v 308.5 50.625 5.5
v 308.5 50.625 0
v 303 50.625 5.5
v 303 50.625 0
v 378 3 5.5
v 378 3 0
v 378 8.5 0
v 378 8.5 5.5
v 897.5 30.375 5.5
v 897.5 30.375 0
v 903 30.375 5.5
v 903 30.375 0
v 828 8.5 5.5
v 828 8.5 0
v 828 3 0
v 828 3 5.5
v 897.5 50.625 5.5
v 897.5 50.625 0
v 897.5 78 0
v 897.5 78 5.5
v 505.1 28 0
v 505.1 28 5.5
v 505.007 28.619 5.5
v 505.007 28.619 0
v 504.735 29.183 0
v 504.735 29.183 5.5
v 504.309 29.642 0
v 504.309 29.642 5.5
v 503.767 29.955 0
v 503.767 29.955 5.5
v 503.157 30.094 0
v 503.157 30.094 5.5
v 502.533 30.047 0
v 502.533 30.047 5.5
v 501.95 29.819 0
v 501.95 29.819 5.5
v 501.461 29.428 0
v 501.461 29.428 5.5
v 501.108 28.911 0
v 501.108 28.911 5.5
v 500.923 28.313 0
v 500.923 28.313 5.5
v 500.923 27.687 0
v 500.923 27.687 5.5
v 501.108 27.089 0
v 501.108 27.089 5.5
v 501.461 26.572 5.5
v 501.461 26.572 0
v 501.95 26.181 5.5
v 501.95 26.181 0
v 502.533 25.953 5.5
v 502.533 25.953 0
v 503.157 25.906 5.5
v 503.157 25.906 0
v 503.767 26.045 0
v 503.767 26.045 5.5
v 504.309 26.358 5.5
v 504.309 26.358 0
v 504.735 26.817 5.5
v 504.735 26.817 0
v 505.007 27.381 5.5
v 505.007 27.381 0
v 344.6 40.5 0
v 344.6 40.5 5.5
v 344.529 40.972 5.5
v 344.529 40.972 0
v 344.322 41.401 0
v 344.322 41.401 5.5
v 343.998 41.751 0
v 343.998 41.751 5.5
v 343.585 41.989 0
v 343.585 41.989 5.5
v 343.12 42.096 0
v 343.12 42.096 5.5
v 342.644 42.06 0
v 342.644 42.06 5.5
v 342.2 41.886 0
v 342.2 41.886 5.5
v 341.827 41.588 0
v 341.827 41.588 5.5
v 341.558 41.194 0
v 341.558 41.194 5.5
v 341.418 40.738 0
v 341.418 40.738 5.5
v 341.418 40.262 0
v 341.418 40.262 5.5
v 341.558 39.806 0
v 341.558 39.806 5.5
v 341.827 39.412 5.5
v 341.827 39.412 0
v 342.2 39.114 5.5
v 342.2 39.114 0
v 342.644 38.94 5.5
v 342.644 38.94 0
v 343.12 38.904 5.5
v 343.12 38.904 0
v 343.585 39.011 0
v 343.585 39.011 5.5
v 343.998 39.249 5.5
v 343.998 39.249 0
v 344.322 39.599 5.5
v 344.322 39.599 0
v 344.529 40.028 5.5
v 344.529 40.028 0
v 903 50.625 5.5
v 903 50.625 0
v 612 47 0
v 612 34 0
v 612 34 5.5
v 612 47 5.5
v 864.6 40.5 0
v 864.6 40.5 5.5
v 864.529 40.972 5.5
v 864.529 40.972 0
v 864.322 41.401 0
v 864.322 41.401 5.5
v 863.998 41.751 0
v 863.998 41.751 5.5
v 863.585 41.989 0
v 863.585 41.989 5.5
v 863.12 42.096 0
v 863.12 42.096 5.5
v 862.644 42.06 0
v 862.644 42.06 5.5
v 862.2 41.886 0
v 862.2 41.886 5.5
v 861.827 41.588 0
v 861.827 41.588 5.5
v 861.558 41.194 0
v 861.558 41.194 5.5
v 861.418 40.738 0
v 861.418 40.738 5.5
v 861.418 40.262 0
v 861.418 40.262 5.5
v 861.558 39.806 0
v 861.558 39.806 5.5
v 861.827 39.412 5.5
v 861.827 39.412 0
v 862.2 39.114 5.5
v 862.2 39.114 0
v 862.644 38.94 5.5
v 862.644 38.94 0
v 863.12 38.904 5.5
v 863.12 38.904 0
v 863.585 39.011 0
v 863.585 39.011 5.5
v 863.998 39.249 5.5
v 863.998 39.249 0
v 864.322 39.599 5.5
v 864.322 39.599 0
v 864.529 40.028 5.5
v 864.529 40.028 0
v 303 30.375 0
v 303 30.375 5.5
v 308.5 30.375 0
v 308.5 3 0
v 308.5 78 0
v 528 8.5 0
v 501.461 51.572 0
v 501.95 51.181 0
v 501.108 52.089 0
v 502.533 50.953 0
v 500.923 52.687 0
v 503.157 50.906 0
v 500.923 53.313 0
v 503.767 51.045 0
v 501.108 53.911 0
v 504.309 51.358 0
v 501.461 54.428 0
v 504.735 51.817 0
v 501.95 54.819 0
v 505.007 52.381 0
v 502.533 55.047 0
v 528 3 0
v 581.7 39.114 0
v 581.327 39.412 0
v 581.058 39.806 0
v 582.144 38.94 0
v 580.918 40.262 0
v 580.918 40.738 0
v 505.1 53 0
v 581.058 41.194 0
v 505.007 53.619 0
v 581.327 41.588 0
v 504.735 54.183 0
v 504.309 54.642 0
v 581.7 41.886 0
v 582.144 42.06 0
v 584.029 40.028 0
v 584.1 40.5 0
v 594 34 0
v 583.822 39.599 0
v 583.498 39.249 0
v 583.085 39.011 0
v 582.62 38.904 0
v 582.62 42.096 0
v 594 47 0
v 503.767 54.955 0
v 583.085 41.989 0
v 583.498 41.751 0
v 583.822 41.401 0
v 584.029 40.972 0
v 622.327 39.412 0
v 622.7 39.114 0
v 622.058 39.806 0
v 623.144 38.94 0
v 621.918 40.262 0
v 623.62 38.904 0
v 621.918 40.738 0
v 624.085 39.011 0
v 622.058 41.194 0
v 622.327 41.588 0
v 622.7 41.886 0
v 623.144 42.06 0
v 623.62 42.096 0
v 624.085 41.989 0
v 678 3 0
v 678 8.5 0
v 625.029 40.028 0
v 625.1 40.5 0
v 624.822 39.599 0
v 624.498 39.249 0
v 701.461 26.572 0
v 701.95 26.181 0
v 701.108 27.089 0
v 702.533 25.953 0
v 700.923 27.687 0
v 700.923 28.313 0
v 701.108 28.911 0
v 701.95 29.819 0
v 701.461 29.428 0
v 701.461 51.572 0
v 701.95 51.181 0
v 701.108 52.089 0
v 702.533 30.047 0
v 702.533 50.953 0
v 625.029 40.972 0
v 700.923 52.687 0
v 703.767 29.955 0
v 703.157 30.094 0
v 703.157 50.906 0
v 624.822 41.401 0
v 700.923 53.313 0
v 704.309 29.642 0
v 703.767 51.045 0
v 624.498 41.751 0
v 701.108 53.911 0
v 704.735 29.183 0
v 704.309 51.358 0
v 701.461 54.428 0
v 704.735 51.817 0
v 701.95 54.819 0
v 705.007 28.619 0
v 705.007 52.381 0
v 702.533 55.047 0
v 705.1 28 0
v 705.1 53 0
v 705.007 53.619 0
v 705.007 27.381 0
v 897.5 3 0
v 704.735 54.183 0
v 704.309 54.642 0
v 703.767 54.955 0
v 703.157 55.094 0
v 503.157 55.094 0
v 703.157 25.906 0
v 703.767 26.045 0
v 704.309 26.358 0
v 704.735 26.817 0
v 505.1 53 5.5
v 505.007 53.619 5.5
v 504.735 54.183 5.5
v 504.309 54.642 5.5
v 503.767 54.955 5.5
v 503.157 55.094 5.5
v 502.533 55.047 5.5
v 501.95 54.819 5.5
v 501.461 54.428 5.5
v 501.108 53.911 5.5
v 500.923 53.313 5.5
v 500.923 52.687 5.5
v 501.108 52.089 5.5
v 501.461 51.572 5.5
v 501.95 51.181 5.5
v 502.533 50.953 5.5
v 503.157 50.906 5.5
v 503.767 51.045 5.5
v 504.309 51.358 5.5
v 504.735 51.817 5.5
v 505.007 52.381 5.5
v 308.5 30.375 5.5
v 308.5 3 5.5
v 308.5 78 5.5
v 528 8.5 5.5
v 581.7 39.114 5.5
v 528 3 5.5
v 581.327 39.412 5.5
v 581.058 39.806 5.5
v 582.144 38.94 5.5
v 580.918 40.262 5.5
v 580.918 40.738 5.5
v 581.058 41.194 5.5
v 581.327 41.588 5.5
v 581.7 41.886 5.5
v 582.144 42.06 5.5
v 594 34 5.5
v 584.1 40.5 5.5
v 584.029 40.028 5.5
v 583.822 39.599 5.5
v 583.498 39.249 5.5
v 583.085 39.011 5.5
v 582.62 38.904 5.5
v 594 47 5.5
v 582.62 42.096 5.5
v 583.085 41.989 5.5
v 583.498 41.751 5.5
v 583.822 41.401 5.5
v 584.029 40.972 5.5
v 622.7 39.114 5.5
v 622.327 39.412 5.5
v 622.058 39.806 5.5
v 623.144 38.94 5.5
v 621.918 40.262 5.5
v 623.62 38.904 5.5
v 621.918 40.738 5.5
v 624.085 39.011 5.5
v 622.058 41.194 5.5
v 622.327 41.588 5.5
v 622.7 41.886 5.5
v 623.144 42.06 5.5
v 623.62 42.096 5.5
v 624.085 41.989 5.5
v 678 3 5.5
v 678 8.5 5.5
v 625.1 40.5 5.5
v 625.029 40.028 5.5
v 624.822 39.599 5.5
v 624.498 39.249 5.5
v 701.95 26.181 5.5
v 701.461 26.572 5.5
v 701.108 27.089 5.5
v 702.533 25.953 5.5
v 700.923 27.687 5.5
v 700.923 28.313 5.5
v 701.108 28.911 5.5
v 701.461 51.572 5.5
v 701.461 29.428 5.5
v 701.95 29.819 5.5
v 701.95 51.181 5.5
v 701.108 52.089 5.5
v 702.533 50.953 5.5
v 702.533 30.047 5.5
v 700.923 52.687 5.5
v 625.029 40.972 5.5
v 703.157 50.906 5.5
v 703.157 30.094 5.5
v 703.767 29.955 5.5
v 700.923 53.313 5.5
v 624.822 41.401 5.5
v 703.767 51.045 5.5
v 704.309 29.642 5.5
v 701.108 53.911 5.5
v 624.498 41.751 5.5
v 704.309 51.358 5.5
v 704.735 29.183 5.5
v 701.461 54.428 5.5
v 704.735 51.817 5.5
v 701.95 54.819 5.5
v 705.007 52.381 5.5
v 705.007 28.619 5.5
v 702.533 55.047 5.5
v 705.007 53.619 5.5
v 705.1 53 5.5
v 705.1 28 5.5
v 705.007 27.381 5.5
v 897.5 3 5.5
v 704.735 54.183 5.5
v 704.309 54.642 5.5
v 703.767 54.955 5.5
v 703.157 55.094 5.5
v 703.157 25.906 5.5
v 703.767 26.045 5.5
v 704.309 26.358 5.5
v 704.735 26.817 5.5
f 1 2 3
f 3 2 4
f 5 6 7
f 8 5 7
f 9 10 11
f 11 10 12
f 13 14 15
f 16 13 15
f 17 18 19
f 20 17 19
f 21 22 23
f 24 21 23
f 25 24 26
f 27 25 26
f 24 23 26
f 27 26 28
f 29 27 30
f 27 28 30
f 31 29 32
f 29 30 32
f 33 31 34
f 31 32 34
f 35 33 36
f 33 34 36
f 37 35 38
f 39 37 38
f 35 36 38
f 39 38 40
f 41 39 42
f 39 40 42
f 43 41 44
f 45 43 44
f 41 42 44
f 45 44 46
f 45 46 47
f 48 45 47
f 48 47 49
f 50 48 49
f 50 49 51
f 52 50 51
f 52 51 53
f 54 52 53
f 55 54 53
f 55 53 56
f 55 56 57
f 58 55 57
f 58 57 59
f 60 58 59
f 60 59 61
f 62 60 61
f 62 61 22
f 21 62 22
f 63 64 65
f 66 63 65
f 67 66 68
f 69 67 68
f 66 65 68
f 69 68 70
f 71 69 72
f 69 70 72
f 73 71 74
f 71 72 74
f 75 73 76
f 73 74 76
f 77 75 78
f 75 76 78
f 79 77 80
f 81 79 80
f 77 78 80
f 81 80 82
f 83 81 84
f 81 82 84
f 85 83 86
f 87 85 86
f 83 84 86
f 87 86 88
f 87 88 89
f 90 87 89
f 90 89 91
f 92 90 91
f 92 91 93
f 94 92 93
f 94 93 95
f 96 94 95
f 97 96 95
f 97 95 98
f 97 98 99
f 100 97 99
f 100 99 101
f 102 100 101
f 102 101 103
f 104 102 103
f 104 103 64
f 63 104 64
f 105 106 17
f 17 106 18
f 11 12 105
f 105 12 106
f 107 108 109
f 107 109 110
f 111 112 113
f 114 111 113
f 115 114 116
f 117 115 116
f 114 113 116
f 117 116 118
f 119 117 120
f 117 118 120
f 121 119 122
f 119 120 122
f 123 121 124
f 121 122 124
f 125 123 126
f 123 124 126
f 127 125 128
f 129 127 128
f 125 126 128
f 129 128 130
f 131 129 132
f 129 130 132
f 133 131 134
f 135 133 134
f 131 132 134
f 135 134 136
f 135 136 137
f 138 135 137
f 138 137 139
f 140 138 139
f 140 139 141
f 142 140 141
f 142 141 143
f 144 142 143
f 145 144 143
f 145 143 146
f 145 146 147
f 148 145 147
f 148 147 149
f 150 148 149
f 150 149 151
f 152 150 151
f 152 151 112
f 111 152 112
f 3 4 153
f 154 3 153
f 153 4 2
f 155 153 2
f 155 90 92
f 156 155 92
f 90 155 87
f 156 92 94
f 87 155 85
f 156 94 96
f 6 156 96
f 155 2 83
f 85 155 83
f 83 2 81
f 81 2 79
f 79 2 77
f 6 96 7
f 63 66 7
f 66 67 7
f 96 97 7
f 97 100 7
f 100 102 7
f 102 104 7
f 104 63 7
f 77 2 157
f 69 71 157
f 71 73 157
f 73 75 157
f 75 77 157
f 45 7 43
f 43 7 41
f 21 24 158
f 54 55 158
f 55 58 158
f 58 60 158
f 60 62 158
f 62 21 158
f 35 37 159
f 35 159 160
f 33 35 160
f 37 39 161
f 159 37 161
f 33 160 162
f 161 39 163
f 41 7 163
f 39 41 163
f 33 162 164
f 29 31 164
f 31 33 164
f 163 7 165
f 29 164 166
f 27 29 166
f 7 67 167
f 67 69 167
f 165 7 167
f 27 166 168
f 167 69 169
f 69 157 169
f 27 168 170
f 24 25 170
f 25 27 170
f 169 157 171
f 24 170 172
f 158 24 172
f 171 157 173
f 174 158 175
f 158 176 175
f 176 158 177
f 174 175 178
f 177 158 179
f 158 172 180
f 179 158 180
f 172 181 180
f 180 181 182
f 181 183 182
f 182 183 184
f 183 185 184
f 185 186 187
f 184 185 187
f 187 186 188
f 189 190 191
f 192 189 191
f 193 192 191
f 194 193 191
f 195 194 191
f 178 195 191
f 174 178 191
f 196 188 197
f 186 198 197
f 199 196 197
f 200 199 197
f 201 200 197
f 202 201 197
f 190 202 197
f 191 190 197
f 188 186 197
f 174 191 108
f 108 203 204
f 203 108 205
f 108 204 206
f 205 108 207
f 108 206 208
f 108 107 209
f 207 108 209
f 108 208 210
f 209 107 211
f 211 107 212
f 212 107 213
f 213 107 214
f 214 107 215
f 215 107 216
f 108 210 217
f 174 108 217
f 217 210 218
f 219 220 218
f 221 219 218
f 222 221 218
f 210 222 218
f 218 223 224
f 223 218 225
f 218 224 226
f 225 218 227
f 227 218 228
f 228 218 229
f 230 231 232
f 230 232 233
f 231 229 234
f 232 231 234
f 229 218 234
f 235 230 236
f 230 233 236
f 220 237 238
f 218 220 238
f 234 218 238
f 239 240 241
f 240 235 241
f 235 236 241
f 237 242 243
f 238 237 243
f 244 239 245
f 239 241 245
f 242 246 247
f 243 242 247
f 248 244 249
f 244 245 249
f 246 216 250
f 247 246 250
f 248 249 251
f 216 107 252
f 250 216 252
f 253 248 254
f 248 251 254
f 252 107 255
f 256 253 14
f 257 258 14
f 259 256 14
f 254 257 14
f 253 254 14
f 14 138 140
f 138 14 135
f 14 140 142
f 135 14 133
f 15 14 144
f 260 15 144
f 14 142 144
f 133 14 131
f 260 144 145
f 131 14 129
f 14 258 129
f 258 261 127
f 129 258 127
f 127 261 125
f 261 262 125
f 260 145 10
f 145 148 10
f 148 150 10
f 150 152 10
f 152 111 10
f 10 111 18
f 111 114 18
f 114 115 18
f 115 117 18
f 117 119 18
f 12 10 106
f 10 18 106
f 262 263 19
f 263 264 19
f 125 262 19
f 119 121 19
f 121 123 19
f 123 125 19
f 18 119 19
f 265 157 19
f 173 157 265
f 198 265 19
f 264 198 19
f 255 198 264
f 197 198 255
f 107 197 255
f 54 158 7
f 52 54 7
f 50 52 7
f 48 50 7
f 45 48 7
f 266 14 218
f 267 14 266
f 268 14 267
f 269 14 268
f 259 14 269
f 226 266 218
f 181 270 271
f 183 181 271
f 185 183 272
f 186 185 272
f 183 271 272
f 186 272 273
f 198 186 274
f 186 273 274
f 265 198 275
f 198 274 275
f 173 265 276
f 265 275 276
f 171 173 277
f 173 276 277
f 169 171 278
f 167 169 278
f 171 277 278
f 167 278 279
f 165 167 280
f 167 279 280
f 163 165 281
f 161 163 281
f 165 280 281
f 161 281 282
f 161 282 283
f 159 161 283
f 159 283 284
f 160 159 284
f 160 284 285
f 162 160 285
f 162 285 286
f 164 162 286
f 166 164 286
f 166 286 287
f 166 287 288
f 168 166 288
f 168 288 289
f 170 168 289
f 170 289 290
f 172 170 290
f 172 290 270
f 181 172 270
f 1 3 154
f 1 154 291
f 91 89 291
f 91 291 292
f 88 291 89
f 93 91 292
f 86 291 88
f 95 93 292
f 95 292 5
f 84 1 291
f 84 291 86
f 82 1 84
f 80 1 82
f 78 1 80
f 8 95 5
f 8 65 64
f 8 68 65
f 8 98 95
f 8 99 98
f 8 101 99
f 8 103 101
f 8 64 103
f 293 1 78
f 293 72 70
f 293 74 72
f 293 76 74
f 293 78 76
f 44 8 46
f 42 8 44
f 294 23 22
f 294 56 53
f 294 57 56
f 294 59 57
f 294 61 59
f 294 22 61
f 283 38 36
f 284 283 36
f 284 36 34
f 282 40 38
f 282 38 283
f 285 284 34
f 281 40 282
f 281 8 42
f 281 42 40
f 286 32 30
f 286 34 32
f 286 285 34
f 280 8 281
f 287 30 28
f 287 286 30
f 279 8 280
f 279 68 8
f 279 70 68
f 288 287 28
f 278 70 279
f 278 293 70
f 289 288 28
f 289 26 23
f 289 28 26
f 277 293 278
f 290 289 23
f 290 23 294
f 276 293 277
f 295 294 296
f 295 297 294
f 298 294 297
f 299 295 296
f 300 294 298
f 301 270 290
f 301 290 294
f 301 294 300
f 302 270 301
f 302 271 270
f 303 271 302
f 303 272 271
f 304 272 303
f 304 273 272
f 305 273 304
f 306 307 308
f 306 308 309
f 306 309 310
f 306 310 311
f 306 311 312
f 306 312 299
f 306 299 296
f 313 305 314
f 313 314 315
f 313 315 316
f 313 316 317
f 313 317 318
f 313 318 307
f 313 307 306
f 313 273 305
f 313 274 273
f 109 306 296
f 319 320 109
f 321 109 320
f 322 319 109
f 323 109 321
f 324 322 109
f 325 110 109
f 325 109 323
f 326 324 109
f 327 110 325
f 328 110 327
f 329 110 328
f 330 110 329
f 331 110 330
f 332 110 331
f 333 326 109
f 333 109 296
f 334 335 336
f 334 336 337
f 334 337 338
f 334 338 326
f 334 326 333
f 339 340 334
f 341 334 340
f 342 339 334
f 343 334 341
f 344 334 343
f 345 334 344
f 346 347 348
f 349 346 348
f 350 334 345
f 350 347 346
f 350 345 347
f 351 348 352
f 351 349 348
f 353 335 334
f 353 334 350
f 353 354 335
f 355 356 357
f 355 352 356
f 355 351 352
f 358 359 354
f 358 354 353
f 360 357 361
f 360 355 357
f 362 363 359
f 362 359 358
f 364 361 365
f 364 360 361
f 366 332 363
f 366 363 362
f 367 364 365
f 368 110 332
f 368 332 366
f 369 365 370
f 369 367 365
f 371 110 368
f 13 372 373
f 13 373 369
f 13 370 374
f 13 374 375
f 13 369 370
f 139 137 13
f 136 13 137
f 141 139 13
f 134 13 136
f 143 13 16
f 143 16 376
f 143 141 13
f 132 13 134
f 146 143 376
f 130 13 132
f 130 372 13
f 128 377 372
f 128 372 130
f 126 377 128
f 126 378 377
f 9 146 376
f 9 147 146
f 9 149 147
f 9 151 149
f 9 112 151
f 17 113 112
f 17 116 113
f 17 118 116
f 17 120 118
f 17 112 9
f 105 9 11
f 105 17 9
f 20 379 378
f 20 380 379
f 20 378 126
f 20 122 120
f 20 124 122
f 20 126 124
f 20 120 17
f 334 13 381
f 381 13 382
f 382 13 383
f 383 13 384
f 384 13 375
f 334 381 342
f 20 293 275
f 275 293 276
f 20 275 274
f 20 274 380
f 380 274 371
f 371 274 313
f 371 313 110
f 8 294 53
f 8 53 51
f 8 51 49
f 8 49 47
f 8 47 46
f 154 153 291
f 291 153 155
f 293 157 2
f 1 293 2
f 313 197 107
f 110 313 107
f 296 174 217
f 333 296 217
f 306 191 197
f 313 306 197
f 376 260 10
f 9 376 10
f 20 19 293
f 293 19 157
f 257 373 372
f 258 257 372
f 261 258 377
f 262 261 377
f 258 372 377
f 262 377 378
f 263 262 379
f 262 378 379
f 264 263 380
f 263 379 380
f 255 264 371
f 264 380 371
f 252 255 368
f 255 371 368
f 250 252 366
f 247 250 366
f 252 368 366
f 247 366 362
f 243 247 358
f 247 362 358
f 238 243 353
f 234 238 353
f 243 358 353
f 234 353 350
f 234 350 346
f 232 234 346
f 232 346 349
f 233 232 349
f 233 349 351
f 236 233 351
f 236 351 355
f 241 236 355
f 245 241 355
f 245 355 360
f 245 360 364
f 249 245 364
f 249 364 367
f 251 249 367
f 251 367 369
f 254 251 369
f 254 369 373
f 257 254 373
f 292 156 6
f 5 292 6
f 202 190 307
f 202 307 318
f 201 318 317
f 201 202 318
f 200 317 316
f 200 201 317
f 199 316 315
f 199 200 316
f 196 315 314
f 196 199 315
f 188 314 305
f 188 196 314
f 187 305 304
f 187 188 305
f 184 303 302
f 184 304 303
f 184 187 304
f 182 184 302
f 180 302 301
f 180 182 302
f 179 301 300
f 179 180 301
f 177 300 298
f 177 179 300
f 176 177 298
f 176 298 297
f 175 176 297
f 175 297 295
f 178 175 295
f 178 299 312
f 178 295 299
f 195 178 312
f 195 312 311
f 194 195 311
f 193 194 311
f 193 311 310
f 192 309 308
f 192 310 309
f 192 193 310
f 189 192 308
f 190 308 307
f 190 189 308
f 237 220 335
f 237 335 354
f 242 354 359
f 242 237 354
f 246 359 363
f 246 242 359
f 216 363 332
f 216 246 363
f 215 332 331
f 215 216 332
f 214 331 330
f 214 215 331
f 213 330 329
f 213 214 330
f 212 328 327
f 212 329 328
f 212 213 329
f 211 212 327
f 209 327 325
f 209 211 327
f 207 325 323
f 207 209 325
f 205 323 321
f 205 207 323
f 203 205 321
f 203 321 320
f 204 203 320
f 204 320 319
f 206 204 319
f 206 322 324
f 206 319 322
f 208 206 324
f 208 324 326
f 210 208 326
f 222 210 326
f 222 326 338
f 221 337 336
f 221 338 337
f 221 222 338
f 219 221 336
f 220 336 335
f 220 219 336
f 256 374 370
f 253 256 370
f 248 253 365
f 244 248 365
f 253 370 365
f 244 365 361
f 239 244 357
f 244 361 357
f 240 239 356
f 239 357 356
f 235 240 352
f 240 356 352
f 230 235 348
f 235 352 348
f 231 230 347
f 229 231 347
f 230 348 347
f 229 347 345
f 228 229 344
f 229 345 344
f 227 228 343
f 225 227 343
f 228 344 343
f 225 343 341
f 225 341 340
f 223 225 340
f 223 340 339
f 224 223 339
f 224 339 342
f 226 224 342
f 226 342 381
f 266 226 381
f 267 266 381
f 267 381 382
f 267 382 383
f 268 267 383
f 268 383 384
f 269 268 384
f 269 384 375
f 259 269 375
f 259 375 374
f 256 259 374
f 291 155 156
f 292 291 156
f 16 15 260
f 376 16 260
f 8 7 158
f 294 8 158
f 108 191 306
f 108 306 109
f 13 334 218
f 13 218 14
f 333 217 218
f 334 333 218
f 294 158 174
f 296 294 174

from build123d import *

# Parameters (mm, degrees)
BOSS_EXTRUDE1_DEPTH     = 5.5
CUT_EXTRUDE1_DEPTH      = 907.379197687
CUT_EXTRUDE1_DEPTH_BACK = 907.379197687
SKETCH2_R               = 1.6
SKETCH2_W               = 18
SKETCH2_H               = 13
SKETCH3_R               = 2.1
CUT_EXTRUDE2_DEPTH      = 907.379197687
SKETCH4_R               = 1.6
CUT_EXTRUDE3_DEPTH      = 907.379197687
SKETCH5_W               = 3.25
SKETCH5_H               = 9.45
SKETCH5_H_2             = 2.65
SKETCH5_W_2             = 1.25
SKETCH5_H_3             = 3.25
BOSS_EXTRUDE2_DEPTH     = 5.5


with BuildPart() as part:
    # Sketch1 → Boss-Extrude1 (new body)
    with BuildSketch(Plane.XY):
        Polygon((308.5, 78), (308.5, 50.625), (303, 50.625), (303, 42.125), (306.25, 42.125), (306.25, 40.5), (306.25, 38.875), (303, 38.875), (303, 30.375), (308.5, 30.375), (308.5, 3), (378, 3), (378, 8.5), (451.375, 8.5), (451.375, 17.95), (450.125, 17.95), (450.125, 20.6), (451.375, 20.6), (451.375, 23.25), (454.625, 23.25), (454.625, 20.6), (455.875, 20.6), (455.875, 17.95), (454.625, 17.95), (454.625, 8.5), (528, 8.5), (528, 3), (678, 3), (678, 8.5), (751.375, 8.5), (751.375, 17.95), (750.125, 17.95), (750.125, 20.6), (751.375, 20.6), (751.375, 23.25), (754.625, 23.25), (754.625, 20.6), (755.875, 20.6), (755.875, 17.95), (754.625, 17.95), (754.625, 8.5), (828, 8.5), (828, 3), (897.5, 3), (897.5, 30.375), (903, 30.375), (903, 38.875), (899.75, 38.875), (899.75, 40.5), (899.75, 42.125), (903, 42.125), (903, 50.625), (897.5, 50.625), (897.5, 78), align=None)
    extrude(amount=BOSS_EXTRUDE1_DEPTH)

    # Sketch2 → Cut-Extrude1 (cut, two sides: drawn at the far end of the back side and taken through both)
    with BuildSketch(Plane.XY.offset(5.5).offset(-CUT_EXTRUDE1_DEPTH_BACK)):
        with Locations((582.5, 40.5)):
            Circle(SKETCH2_R)
        with Locations((623.5, 40.5)):
            Circle(SKETCH2_R)
        with Locations((603, 40.5)):
            Rectangle(SKETCH2_W, SKETCH2_H)
    extrude(amount=CUT_EXTRUDE1_DEPTH + CUT_EXTRUDE1_DEPTH_BACK, mode=Mode.SUBTRACT)

    # Sketch3 → Cut-Extrude2 (cut, through all)
    with BuildSketch(Plane.XY.offset(5.5)):
        with Locations((503, 53)):
            Circle(SKETCH3_R)
        with Locations((503, 28)):
            Circle(SKETCH3_R)
        with Locations((703, 28)):
            Circle(SKETCH3_R)
        with Locations((703, 53)):
            Circle(SKETCH3_R)
    extrude(amount=-CUT_EXTRUDE2_DEPTH, mode=Mode.SUBTRACT)

    # Sketch4 → Cut-Extrude3 (cut, through all)
    with BuildSketch(Plane.XY.offset(5.5)):
        with Locations((343, 40.5)):
            Circle(SKETCH4_R)
        with Locations((863, 40.5)):
            Circle(SKETCH4_R)
    extrude(amount=-CUT_EXTRUDE3_DEPTH, mode=Mode.SUBTRACT)

    # Sketch5 → Boss-Extrude2 (add)
    with BuildSketch(Plane.XY.offset(5.5)):
        with Locations((753, 13.225)):
            Rectangle(SKETCH5_W, SKETCH5_H)
        with Locations((753, 19.275)):
            Rectangle(SKETCH5_W, SKETCH5_H_2)
        with Locations((750.75, 19.275)):
            Rectangle(SKETCH5_W_2, SKETCH5_H_2)
        with Locations((753, 21.925)):
            Rectangle(SKETCH5_W, SKETCH5_H_2)
        with Locations((755.25, 19.275)):
            Rectangle(SKETCH5_W_2, SKETCH5_H_2)
        with Locations((901.375, 40.5)):
            Rectangle(SKETCH5_W, SKETCH5_H_3)
        with Locations((453, 13.225)):
            Rectangle(SKETCH5_W, SKETCH5_H)
        with Locations((453, 19.275)):
            Rectangle(SKETCH5_W, SKETCH5_H_2)
        with Locations((453, 21.925)):
            Rectangle(SKETCH5_W, SKETCH5_H_2)
        with Locations((450.75, 19.275)):
            Rectangle(SKETCH5_W_2, SKETCH5_H_2)
        with Locations((455.25, 19.275)):
            Rectangle(SKETCH5_W_2, SKETCH5_H_2)
        with Locations((304.625, 40.5)):
            Rectangle(SKETCH5_W, SKETCH5_H_3)
    extrude(amount=-BOSS_EXTRUDE2_DEPTH)


solid = part.part
